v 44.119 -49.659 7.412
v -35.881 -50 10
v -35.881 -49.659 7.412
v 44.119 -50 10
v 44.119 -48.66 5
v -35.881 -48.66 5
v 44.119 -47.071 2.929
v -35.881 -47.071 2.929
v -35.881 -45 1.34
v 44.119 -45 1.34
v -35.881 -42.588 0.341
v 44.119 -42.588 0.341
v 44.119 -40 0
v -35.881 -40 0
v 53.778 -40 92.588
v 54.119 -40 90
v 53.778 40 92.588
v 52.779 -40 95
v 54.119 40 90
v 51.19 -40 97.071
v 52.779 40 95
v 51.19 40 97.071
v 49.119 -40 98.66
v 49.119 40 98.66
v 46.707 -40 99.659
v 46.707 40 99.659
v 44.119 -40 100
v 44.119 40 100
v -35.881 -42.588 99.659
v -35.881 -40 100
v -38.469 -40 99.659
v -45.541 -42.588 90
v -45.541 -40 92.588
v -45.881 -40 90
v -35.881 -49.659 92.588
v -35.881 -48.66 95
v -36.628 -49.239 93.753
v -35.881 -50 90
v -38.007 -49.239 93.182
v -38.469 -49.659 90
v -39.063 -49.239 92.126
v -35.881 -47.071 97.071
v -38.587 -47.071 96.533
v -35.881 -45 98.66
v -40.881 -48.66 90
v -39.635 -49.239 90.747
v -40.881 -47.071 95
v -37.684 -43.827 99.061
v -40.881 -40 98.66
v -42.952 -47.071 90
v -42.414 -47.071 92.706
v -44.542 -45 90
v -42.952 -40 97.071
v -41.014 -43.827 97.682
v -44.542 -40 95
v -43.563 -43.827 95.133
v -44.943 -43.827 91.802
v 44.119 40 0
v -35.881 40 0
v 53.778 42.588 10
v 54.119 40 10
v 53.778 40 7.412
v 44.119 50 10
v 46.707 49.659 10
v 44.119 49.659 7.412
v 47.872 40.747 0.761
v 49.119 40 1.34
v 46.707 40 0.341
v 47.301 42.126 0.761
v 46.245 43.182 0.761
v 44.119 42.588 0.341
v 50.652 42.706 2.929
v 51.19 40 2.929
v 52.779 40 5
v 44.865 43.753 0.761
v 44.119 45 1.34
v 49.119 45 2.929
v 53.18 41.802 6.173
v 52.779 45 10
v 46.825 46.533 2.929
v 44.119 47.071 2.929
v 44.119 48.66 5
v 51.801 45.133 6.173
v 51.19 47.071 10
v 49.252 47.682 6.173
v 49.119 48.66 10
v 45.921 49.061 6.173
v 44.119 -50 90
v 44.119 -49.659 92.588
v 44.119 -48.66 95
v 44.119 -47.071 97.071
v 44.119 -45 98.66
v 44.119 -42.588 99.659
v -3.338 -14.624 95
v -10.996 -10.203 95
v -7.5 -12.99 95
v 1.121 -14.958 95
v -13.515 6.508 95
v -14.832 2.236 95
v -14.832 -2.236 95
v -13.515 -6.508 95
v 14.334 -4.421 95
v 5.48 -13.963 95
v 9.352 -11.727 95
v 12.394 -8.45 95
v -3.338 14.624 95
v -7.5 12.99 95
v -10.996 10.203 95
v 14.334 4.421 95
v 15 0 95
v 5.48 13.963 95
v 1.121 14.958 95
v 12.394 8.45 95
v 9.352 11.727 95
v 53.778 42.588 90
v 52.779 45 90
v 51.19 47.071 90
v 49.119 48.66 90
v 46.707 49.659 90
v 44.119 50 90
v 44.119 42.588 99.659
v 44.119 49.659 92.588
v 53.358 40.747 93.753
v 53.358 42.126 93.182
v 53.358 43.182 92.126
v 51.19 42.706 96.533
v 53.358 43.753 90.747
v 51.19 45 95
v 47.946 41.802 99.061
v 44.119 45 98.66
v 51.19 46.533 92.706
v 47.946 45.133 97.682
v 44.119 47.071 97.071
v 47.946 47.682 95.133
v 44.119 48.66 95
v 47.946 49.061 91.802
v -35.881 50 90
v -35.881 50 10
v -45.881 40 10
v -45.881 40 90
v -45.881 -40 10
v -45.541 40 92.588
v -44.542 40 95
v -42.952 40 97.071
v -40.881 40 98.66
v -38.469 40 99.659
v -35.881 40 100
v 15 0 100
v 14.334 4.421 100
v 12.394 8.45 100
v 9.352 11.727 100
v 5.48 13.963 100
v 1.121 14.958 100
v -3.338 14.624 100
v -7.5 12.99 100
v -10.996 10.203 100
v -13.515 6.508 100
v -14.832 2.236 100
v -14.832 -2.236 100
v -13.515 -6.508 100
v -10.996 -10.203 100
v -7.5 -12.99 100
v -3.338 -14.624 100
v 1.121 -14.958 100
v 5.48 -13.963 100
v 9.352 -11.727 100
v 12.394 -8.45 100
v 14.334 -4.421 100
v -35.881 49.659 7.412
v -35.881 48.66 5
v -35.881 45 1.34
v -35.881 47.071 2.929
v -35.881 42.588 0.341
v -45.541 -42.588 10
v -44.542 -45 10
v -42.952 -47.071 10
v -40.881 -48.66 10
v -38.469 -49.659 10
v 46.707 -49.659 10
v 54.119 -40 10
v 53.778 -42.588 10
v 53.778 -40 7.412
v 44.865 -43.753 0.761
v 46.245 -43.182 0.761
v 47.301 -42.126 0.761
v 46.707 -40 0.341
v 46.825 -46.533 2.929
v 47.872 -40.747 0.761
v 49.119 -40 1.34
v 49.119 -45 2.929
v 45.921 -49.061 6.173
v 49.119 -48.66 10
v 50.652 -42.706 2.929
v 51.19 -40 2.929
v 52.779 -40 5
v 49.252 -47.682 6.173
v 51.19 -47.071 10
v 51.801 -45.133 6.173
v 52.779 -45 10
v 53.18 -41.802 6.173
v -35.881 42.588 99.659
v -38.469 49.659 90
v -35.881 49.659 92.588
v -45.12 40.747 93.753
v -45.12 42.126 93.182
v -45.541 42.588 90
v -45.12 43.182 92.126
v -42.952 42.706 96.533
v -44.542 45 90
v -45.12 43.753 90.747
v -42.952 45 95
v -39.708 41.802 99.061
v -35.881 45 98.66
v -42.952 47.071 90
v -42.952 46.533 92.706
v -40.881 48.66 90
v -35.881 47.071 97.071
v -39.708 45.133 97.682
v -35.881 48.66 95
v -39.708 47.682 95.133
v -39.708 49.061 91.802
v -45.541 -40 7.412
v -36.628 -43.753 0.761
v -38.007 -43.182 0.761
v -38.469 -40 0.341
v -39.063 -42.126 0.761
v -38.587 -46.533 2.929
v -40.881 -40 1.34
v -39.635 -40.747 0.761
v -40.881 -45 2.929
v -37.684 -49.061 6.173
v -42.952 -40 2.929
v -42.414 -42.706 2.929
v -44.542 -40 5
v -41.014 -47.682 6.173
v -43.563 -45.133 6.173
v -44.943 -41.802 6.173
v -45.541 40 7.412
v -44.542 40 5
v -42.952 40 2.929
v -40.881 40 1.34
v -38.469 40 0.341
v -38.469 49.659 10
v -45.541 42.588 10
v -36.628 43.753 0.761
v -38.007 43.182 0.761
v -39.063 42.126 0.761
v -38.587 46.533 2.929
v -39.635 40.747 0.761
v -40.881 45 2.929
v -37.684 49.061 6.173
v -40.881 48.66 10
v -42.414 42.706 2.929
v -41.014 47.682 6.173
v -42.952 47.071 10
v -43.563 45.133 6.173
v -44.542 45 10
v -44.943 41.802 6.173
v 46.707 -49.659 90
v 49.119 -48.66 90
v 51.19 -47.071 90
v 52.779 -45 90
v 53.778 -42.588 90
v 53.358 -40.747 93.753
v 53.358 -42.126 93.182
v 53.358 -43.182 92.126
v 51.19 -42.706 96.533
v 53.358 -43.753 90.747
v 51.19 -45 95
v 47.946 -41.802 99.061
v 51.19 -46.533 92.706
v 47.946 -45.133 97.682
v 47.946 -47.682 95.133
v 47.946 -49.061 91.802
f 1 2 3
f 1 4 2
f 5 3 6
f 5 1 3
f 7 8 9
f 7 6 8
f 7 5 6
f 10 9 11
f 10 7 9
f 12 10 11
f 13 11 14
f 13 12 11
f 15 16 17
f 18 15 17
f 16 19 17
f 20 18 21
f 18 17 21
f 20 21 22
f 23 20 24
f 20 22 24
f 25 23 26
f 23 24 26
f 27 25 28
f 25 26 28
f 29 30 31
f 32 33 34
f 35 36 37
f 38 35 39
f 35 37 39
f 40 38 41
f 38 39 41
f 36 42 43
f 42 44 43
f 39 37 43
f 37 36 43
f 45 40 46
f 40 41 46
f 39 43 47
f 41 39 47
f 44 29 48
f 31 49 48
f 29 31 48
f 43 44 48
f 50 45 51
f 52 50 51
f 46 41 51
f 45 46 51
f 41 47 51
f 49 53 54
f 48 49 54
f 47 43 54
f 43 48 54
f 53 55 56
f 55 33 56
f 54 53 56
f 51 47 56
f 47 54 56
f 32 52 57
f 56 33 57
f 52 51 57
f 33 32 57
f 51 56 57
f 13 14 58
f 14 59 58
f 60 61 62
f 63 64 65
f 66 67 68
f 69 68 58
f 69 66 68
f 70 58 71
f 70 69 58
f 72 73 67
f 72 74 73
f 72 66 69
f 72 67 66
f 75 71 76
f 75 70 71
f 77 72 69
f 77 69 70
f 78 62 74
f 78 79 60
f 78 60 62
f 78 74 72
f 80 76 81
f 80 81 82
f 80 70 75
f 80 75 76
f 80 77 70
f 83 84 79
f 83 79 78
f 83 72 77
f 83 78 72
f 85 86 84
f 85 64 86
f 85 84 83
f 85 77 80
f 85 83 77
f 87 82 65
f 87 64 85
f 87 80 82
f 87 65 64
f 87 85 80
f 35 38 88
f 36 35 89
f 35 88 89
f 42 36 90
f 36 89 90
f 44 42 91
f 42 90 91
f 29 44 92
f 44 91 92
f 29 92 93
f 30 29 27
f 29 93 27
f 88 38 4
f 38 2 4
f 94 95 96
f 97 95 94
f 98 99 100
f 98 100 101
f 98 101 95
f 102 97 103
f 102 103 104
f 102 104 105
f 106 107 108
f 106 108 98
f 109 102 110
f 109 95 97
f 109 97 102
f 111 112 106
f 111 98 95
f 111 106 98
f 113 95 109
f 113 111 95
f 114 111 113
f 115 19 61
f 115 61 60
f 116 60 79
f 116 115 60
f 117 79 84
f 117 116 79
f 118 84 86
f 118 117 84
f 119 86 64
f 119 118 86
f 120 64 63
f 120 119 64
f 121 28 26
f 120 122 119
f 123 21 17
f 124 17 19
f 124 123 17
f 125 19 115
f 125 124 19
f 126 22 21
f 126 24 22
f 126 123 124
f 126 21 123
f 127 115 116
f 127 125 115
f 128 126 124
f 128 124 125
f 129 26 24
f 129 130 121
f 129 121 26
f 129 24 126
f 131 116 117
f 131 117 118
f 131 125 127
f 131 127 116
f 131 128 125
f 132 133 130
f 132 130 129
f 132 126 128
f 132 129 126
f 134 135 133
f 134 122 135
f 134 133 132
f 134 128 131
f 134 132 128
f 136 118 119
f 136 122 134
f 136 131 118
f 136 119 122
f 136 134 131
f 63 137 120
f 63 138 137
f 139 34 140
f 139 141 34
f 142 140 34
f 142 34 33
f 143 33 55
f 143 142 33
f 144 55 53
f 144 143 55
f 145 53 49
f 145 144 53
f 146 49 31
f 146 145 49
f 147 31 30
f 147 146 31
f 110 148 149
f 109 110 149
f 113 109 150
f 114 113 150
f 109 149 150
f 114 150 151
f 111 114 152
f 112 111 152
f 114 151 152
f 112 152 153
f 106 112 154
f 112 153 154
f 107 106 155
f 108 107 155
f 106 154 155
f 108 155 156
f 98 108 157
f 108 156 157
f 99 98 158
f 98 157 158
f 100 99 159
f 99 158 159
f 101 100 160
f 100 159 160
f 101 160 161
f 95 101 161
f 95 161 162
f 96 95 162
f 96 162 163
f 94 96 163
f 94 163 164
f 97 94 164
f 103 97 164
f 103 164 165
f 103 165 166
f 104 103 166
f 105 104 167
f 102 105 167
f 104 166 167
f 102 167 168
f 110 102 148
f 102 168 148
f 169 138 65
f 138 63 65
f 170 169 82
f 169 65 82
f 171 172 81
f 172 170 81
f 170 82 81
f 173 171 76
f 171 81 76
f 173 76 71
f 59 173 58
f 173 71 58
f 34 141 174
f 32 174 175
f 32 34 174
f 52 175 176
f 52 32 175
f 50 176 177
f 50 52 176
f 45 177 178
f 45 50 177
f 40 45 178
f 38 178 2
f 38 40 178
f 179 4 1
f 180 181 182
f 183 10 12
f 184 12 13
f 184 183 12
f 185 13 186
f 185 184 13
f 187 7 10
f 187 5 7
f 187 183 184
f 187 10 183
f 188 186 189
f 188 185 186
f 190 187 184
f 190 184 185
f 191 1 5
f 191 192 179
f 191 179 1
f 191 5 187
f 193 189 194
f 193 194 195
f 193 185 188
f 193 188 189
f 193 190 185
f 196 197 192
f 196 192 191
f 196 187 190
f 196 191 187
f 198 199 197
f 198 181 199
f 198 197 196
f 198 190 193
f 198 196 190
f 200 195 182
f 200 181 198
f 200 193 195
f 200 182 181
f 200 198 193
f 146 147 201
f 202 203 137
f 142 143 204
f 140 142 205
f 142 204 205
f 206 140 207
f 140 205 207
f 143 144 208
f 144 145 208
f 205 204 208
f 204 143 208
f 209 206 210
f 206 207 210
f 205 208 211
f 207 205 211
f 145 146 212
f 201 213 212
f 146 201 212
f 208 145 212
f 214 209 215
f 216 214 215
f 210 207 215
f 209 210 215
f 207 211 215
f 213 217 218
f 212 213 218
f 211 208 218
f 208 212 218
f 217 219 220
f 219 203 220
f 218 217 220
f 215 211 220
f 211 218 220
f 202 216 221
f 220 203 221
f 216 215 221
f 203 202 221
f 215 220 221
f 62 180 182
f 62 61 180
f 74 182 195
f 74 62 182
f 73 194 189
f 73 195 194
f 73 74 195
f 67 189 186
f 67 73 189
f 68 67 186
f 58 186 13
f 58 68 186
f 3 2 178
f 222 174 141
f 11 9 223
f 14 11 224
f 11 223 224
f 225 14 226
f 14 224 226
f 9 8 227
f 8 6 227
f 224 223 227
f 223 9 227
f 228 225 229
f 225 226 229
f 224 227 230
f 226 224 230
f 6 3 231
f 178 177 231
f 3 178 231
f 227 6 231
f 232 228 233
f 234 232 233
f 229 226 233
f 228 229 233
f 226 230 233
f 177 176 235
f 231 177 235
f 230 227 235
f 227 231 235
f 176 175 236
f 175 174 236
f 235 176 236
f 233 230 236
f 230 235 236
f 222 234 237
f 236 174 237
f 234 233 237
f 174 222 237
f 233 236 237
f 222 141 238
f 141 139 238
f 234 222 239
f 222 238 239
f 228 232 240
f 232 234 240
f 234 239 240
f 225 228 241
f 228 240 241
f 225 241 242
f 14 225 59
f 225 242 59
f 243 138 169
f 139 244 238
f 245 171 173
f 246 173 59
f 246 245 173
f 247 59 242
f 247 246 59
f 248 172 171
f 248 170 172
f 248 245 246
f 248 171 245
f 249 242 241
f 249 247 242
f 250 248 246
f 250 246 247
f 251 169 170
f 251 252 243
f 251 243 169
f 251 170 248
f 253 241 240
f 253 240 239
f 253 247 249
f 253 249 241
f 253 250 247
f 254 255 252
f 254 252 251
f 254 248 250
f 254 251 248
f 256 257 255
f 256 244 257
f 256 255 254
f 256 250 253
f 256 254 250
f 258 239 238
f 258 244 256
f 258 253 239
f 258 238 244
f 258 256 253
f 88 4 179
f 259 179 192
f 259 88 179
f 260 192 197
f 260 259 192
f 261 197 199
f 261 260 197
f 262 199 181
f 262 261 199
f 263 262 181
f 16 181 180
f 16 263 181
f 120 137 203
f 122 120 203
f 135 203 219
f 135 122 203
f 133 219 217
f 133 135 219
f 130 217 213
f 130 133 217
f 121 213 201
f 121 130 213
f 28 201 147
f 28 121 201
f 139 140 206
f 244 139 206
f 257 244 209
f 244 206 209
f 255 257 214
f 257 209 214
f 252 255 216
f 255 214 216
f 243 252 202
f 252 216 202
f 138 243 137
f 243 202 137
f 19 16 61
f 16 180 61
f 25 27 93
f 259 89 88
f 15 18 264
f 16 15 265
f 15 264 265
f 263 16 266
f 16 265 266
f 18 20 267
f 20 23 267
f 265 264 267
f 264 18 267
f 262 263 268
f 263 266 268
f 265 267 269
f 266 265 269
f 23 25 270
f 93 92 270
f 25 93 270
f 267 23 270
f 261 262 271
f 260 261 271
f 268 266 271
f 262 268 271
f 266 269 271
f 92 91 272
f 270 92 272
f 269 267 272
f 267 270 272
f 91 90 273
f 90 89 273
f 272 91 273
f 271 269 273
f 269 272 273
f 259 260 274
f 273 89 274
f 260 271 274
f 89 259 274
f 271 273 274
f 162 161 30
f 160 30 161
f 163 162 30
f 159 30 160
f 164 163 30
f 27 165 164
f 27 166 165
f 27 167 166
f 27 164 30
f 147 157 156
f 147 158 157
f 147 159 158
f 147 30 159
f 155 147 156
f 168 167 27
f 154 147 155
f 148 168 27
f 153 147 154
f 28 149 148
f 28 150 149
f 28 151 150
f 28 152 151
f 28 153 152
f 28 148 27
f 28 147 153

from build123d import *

# Parameters (mm, degrees)
F0_W     = 100
F0_H     = 100
F1_DEPTH = 100
F2_R     = 10
F3_R     = 15
F4_DEPTH = 5


with BuildPart() as f1:
    # F0 (on Top) → F1 (new body)
    with BuildSketch(Plane.XY):
        with Locations((4.118751, 0)):
            Rectangle(F0_W, F0_H)
    extrude(amount=F1_DEPTH)

    # F2
    f2_edges = [f1.edges().sort_by_distance(p)[0] for p in [
        (4.118751, 50, 100),
        (-45.881249, 0, 100),
        (4.118751, -50, 100),
        (54.118751, 0, 100),
        (-45.881249, -50, 50),
        (54.118751, -50, 50),
        (4.118751, -50, 0),
        (54.118751, 50, 50),
        (54.118751, 0, 0),
        (-45.881249, 50, 50),
        (4.118751, 50, 0),
        (-45.881249, 0, 0),
    ]]
    fillet(f2_edges, radius=F2_R)

    # F3 (on face) → F4 (cut)
    with BuildSketch(Plane.XY.offset(100)):
        Circle(F3_R)
    extrude(amount=-F4_DEPTH, mode=Mode.SUBTRACT)


solid = f1.part
